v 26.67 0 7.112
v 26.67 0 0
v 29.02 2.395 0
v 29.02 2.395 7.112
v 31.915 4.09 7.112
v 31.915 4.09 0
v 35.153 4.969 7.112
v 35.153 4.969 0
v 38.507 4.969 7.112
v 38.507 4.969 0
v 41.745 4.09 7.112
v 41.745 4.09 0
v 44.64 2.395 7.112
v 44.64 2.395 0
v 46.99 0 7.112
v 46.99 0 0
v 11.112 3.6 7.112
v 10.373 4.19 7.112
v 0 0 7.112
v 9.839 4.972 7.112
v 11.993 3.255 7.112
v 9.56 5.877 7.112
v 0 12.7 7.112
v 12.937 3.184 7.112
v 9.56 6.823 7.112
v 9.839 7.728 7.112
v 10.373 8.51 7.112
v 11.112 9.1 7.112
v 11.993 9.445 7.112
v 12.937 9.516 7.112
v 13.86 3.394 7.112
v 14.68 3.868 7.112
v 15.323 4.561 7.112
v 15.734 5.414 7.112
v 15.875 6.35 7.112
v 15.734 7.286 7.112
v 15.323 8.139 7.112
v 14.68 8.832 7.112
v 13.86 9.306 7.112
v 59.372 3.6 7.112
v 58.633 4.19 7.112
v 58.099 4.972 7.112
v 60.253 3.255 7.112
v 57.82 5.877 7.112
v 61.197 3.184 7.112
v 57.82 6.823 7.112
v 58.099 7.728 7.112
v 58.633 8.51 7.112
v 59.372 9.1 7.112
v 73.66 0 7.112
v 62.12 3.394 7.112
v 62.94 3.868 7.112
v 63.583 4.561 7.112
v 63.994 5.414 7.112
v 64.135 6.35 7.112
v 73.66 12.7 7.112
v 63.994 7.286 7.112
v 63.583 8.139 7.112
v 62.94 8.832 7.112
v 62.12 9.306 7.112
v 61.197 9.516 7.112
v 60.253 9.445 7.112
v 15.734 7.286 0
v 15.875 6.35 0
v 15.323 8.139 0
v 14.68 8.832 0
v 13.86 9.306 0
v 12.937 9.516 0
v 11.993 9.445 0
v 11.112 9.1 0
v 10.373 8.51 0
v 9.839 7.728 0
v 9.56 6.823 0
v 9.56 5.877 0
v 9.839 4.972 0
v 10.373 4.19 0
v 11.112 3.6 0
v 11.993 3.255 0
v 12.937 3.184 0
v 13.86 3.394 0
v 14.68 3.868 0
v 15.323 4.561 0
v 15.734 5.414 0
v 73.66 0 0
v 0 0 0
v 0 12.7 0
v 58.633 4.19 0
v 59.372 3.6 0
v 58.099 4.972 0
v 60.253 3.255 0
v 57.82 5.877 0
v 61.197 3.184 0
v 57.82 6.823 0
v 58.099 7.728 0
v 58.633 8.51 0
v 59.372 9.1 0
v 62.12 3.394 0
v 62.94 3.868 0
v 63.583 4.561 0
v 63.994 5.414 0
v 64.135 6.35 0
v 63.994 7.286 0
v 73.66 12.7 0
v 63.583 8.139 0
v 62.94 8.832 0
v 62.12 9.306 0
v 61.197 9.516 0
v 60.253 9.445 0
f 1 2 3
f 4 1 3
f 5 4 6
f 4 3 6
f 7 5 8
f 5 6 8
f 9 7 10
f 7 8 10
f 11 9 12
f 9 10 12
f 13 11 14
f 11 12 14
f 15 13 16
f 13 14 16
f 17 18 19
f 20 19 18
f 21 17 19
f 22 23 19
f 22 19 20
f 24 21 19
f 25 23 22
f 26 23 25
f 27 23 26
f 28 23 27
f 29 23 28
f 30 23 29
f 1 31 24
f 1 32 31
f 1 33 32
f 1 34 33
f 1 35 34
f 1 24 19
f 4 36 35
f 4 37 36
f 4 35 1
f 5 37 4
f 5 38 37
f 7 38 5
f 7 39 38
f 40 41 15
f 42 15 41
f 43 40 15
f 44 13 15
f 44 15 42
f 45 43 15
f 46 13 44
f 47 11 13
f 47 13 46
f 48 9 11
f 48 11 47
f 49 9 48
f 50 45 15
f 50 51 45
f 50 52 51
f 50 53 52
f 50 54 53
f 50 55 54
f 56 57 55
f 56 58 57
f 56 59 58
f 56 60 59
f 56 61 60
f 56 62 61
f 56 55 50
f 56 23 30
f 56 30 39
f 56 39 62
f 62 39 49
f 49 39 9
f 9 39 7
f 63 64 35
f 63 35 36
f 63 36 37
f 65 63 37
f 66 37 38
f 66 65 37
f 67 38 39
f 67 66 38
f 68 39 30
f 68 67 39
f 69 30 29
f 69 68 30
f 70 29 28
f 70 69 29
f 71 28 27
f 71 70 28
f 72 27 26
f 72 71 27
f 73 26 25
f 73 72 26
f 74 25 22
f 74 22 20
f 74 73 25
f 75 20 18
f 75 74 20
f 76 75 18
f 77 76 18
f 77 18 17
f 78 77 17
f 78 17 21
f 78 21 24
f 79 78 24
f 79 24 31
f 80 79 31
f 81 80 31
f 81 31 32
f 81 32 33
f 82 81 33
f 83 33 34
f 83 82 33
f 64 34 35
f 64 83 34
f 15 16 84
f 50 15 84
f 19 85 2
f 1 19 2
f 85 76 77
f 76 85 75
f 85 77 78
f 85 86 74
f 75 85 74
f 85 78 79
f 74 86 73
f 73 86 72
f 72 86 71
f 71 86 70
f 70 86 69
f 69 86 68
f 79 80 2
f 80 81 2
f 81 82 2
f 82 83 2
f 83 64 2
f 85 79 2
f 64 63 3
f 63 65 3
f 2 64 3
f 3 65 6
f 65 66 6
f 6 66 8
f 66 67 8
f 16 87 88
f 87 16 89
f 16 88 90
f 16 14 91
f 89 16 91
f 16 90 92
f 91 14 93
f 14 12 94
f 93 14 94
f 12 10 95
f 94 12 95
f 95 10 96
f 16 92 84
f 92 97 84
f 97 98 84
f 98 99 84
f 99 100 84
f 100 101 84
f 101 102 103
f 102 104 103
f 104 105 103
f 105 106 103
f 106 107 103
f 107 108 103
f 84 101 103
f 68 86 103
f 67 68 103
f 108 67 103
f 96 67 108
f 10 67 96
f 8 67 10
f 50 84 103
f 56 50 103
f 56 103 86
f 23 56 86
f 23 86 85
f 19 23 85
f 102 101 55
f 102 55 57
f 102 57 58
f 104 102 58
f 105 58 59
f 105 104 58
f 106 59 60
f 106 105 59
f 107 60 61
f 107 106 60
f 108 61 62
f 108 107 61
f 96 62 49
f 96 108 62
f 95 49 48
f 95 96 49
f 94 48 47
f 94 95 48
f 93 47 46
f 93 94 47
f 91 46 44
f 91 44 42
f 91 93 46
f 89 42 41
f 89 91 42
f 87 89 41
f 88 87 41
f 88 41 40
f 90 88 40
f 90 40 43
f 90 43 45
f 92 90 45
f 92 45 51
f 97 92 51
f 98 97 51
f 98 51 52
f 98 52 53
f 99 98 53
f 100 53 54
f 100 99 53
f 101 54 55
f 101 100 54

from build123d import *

# Parameters (mm, degrees)
SKETCH1_R           = 3.175
BOSS_EXTRUDE1_DEPTH = 7.112


with BuildPart() as part:
    # Sketch1 → Boss-Extrude1 (new body)
    with BuildSketch(Plane.XY):
        with BuildLine():
            Line((46.99, 0), (73.66, 0))
            Line((73.66, 0), (73.66, 12.7))
            Line((73.66, 12.7), (0, 12.7))
            Line((0, 12.7), (0, 0))
            Line((0, 0), (26.67, 0))
            ThreePointArc((26.67, 0), (36.83, 5.08), (46.99, 0))
        make_face()
        with Locations((12.7, 6.35)):
            Circle(SKETCH1_R, mode=Mode.SUBTRACT)
        with Locations((60.96, 6.35)):
            Circle(SKETCH1_R, mode=Mode.SUBTRACT)
    extrude(amount=BOSS_EXTRUDE1_DEPTH)


solid = part.part
